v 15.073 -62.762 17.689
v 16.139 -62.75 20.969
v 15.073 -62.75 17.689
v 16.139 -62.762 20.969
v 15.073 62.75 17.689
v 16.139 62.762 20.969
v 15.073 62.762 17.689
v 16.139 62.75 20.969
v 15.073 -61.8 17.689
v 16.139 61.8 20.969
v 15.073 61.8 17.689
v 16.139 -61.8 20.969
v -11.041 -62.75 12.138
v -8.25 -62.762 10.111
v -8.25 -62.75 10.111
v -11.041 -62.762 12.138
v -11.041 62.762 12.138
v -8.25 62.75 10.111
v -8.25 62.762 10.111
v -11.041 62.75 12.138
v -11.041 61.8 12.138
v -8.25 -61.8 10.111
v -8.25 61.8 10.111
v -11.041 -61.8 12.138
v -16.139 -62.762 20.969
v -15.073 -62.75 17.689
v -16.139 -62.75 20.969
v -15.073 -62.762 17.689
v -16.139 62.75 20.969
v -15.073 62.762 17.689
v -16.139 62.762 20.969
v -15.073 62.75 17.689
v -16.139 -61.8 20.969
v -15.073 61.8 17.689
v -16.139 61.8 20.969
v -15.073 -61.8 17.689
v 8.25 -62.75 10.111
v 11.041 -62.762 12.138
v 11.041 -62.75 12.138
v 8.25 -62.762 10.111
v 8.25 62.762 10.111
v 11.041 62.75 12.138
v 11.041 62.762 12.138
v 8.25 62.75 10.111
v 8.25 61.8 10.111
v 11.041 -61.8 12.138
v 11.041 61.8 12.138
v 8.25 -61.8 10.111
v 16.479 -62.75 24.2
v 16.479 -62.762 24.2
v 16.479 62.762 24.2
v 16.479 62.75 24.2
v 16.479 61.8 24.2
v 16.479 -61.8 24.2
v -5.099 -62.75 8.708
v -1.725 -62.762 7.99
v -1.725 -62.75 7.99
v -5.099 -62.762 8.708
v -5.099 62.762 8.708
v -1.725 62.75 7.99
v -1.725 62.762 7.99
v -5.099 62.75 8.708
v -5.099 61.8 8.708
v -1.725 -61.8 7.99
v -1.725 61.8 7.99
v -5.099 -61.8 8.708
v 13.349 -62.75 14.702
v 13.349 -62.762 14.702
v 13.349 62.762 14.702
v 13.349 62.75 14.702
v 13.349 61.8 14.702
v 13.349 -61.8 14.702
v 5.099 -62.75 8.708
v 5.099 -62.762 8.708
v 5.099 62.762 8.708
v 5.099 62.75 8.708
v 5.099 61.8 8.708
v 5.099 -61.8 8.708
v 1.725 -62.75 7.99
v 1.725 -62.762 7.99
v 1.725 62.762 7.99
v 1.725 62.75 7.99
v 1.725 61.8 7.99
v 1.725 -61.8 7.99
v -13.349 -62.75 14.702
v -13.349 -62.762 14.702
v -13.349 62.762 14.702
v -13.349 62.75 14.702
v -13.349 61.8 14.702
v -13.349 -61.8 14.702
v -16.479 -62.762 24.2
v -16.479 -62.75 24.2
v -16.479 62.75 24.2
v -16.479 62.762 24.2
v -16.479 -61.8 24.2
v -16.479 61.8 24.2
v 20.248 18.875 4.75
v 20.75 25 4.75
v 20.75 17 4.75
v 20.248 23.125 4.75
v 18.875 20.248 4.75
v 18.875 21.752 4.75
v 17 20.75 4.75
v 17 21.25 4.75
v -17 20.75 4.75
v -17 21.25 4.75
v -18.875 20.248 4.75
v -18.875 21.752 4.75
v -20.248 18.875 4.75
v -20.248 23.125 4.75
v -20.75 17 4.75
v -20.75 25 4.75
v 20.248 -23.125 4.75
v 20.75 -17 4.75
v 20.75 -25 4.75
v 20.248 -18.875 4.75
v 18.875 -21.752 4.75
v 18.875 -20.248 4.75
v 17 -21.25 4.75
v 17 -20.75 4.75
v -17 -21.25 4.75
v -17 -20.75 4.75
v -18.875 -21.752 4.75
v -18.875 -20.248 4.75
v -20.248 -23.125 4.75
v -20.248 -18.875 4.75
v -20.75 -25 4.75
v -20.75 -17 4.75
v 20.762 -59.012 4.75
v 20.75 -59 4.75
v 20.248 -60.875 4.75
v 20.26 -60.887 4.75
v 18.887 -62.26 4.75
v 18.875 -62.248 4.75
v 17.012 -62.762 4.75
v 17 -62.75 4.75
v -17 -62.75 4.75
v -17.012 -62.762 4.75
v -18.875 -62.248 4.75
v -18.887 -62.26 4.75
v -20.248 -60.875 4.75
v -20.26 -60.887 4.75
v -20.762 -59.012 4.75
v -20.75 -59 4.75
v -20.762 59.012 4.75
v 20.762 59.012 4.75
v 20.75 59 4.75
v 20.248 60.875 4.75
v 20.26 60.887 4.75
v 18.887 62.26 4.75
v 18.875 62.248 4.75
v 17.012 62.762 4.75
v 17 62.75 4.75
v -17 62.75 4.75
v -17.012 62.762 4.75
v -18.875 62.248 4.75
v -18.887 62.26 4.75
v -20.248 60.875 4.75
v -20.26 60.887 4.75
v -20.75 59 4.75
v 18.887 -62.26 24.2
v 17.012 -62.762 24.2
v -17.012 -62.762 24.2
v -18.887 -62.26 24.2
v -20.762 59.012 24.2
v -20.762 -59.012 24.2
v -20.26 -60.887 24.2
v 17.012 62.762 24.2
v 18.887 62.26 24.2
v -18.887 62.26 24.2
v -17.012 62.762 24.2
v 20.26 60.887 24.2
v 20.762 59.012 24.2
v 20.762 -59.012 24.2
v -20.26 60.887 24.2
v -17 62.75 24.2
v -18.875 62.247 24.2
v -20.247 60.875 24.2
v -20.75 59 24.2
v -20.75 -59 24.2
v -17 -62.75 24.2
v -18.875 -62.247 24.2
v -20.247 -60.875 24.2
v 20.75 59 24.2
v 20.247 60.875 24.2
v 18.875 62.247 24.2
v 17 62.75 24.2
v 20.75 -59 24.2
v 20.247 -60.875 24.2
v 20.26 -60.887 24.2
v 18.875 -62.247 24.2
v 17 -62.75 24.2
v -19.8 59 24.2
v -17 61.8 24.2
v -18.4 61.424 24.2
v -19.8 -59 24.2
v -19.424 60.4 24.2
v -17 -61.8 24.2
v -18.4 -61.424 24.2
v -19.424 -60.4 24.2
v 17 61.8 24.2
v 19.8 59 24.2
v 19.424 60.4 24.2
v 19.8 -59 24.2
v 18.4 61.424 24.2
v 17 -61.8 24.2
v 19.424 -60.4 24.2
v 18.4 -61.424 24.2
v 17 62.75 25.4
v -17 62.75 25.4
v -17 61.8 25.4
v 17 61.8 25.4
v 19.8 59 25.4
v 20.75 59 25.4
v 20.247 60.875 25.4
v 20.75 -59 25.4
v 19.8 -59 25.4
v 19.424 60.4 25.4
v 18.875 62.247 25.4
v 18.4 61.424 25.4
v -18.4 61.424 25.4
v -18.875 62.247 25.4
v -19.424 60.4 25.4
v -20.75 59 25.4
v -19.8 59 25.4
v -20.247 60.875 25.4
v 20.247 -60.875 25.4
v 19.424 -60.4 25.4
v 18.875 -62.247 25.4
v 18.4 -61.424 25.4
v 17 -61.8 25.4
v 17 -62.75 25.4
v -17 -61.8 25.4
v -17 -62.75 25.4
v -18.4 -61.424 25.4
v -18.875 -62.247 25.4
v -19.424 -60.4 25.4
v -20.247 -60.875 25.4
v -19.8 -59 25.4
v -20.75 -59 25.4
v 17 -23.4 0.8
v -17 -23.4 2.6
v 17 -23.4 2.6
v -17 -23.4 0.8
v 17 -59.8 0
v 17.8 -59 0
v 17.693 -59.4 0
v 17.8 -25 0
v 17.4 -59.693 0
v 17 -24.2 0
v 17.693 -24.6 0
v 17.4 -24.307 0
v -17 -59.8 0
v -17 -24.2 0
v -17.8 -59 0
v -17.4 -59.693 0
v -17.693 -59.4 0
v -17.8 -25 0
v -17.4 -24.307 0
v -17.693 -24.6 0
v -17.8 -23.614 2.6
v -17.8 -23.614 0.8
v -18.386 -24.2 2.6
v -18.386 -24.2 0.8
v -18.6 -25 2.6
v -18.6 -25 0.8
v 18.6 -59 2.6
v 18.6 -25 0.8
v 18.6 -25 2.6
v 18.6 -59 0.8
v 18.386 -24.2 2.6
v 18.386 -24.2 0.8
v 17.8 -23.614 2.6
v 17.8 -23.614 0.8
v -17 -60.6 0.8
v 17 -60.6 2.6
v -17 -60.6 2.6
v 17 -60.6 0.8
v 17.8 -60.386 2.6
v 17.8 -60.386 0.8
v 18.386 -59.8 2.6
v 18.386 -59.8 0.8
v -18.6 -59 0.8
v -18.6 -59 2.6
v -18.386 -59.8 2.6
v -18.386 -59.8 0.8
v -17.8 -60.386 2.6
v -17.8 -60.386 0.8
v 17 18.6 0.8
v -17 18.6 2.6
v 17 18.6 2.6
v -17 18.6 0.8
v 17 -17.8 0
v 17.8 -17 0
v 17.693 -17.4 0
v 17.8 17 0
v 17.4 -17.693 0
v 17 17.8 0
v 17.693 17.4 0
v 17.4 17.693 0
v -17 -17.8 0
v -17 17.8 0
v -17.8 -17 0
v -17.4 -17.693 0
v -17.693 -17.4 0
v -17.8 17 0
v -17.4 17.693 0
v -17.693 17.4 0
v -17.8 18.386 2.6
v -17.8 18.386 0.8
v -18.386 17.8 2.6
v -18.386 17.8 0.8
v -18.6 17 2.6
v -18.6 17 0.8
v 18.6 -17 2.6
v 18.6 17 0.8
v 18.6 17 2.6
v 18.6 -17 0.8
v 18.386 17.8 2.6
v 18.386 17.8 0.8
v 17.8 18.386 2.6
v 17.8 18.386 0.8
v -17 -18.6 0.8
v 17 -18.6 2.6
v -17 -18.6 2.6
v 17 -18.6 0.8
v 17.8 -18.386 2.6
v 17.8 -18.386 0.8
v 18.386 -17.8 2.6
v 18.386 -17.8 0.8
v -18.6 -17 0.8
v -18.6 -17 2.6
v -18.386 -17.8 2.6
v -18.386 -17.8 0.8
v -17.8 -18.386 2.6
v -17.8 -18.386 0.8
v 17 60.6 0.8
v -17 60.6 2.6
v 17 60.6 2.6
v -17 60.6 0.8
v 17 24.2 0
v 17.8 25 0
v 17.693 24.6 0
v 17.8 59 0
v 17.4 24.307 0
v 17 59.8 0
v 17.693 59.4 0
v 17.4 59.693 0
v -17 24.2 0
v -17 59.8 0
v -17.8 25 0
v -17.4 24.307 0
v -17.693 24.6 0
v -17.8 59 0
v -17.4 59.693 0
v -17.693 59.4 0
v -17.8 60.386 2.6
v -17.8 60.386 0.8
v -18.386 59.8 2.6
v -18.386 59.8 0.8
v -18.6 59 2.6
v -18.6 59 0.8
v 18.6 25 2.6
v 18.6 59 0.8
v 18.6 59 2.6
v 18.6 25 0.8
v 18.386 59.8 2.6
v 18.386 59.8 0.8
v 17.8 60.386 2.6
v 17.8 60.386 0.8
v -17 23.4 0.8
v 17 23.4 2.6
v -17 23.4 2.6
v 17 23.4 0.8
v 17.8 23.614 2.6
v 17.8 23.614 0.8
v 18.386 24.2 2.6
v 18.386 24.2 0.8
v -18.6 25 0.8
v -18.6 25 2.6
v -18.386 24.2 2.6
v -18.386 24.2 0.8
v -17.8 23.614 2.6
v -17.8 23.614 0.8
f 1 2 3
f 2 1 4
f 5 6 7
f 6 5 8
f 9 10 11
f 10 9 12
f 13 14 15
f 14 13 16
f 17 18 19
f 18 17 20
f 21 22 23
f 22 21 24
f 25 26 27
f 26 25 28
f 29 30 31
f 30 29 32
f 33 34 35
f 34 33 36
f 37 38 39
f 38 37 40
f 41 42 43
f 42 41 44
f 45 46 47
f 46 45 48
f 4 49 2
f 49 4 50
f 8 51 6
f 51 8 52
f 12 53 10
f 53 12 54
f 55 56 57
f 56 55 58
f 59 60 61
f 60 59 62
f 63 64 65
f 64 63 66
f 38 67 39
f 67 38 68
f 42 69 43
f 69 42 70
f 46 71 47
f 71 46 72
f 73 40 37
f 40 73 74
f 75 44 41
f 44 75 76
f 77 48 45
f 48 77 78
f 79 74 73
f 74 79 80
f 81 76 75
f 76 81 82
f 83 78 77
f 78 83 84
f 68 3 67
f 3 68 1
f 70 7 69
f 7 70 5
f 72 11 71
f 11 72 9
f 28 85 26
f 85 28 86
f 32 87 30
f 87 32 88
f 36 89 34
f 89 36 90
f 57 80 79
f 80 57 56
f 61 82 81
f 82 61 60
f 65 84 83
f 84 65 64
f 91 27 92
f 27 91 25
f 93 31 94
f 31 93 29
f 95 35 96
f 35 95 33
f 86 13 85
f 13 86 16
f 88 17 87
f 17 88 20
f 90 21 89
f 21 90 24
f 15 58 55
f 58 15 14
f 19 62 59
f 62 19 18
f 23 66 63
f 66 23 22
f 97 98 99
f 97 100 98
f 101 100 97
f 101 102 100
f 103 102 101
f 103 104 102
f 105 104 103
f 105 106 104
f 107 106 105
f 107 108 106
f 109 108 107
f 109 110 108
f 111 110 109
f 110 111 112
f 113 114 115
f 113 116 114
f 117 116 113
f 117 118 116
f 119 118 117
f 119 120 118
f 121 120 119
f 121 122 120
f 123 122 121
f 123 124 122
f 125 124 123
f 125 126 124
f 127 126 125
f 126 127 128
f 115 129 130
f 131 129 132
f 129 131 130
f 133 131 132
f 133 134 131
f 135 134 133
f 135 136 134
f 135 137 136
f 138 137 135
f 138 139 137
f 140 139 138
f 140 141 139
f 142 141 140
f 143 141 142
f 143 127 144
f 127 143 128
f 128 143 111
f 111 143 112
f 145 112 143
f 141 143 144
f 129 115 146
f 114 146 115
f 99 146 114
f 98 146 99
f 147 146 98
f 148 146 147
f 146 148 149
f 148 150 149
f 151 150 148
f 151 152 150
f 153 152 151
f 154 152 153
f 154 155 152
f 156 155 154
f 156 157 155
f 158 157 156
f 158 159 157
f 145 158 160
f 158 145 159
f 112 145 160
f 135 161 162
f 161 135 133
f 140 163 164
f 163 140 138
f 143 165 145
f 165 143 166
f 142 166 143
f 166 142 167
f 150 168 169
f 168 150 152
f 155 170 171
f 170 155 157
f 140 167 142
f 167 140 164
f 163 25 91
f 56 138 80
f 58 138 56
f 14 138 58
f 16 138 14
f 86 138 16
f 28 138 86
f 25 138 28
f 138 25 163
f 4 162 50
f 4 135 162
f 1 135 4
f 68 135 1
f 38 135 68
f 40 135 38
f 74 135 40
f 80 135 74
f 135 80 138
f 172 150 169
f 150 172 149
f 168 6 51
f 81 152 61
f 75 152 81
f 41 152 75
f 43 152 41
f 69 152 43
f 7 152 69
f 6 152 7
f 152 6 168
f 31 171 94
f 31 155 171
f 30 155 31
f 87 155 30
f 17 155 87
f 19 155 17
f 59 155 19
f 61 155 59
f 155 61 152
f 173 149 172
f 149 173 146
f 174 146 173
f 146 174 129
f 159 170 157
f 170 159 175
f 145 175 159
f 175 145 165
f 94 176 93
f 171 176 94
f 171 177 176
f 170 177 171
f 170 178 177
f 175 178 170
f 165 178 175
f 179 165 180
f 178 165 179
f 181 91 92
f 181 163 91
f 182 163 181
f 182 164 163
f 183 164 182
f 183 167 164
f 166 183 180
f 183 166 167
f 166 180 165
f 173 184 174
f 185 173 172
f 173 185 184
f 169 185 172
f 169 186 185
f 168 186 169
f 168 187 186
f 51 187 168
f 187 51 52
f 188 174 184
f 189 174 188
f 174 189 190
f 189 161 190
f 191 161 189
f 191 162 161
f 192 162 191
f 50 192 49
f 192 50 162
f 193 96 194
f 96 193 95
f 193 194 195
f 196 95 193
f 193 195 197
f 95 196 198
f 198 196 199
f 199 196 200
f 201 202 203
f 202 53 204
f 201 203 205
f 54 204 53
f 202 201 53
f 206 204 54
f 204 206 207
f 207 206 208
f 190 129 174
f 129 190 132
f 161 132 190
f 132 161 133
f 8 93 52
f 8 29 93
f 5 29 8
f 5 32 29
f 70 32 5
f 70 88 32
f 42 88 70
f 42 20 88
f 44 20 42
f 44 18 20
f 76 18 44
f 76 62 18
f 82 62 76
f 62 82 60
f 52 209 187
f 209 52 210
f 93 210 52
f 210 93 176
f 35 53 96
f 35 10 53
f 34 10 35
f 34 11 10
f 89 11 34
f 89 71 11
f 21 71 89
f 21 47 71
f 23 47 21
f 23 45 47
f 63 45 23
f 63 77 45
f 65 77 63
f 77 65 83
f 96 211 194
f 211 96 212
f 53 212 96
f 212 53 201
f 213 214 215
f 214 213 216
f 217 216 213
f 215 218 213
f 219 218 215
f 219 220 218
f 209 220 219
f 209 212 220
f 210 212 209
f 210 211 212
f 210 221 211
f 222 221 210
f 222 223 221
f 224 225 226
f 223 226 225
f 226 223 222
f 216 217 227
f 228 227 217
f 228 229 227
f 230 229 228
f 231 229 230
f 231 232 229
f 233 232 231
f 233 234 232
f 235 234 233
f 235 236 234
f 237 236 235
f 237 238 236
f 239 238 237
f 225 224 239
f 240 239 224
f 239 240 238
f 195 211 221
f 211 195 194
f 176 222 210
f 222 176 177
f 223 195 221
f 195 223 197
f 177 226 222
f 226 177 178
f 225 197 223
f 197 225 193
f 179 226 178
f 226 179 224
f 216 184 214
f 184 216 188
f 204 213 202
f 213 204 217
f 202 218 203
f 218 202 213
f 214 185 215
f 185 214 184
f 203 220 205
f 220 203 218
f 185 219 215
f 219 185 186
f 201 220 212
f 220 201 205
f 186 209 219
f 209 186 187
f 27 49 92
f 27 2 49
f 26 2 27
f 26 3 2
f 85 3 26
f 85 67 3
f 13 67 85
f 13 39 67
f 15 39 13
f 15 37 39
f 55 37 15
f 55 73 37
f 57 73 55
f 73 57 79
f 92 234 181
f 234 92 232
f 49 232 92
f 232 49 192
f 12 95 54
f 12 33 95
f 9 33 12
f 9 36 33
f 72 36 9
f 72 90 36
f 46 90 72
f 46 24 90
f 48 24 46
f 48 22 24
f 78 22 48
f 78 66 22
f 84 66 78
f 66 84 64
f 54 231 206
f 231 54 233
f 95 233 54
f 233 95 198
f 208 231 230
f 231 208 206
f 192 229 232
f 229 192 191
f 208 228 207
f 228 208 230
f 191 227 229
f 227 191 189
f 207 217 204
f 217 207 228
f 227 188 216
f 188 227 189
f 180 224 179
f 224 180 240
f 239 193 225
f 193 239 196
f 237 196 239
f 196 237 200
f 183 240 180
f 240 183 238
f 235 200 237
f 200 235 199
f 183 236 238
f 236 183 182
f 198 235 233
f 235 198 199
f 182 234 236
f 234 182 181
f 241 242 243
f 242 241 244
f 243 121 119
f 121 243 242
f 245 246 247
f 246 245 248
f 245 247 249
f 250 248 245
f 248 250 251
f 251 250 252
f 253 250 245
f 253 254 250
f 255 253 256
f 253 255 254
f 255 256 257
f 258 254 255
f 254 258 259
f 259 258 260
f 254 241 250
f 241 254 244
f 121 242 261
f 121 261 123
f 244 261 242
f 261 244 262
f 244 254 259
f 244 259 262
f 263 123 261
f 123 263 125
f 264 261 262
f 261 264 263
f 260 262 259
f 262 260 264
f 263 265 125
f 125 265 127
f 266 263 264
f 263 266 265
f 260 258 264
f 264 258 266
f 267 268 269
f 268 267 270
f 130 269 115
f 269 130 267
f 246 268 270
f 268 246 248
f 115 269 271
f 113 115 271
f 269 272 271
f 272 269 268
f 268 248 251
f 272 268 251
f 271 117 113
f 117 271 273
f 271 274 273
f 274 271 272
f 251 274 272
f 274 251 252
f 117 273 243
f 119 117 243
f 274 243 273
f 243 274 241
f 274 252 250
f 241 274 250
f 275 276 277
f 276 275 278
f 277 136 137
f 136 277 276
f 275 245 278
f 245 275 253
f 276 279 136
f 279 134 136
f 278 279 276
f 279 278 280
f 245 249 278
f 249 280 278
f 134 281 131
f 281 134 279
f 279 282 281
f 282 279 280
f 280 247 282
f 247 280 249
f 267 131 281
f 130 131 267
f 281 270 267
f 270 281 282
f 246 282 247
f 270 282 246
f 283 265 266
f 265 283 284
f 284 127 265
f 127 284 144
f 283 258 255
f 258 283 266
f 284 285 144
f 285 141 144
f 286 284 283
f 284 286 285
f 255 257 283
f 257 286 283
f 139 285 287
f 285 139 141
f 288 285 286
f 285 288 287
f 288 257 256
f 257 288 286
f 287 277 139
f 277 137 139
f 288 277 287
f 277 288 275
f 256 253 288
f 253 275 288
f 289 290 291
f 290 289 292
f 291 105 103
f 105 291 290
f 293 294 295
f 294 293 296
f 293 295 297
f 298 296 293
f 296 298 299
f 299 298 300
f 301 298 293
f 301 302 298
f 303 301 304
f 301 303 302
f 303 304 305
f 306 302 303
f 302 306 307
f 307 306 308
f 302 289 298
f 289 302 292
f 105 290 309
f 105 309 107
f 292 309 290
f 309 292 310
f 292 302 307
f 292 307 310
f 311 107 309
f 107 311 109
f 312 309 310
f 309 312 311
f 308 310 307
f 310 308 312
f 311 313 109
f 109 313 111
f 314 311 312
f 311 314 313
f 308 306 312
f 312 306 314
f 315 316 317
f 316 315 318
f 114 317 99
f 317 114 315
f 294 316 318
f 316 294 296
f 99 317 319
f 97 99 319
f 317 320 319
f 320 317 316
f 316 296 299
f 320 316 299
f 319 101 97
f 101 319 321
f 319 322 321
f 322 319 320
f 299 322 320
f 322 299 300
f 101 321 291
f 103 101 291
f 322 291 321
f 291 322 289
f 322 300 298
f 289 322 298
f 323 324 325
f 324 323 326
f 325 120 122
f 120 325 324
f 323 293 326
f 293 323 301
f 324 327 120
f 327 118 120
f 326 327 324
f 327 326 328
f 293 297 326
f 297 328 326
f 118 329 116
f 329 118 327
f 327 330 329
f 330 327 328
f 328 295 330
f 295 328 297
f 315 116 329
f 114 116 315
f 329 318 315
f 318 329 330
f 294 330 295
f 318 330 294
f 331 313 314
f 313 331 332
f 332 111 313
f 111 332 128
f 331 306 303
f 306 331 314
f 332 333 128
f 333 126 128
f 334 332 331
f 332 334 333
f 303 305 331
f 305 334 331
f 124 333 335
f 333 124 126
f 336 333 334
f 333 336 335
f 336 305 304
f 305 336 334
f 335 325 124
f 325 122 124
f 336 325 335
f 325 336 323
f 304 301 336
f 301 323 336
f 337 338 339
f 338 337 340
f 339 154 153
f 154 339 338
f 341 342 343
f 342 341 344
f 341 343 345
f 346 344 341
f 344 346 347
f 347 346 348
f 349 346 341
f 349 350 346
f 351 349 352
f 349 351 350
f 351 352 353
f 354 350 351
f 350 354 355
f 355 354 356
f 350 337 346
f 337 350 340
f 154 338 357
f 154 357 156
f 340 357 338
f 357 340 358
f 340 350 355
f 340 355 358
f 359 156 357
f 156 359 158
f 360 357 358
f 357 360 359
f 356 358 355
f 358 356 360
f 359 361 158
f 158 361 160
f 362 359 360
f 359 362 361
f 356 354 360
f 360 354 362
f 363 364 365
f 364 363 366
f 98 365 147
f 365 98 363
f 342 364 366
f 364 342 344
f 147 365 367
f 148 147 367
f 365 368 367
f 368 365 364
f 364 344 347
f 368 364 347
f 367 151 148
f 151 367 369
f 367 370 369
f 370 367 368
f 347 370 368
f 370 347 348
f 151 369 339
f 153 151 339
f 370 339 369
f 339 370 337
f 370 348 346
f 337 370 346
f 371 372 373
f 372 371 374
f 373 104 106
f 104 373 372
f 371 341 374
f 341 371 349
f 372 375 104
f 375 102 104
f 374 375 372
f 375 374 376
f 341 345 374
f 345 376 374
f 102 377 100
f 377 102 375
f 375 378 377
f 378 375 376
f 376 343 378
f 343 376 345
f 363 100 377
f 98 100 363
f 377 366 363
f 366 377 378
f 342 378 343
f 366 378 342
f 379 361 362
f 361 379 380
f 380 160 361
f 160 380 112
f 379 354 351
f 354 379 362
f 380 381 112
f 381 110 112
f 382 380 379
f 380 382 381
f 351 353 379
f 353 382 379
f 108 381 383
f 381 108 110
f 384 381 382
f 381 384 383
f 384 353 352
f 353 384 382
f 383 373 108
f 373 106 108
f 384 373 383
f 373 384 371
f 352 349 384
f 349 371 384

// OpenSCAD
use <entrypoint.scad>

custom_bin(gridx = 1, gridy = 3, gridz = 3, cdivx=1, cdivy=1, divy=0, divx=0, cd=33, height_internal=0, c_depth=1); 
